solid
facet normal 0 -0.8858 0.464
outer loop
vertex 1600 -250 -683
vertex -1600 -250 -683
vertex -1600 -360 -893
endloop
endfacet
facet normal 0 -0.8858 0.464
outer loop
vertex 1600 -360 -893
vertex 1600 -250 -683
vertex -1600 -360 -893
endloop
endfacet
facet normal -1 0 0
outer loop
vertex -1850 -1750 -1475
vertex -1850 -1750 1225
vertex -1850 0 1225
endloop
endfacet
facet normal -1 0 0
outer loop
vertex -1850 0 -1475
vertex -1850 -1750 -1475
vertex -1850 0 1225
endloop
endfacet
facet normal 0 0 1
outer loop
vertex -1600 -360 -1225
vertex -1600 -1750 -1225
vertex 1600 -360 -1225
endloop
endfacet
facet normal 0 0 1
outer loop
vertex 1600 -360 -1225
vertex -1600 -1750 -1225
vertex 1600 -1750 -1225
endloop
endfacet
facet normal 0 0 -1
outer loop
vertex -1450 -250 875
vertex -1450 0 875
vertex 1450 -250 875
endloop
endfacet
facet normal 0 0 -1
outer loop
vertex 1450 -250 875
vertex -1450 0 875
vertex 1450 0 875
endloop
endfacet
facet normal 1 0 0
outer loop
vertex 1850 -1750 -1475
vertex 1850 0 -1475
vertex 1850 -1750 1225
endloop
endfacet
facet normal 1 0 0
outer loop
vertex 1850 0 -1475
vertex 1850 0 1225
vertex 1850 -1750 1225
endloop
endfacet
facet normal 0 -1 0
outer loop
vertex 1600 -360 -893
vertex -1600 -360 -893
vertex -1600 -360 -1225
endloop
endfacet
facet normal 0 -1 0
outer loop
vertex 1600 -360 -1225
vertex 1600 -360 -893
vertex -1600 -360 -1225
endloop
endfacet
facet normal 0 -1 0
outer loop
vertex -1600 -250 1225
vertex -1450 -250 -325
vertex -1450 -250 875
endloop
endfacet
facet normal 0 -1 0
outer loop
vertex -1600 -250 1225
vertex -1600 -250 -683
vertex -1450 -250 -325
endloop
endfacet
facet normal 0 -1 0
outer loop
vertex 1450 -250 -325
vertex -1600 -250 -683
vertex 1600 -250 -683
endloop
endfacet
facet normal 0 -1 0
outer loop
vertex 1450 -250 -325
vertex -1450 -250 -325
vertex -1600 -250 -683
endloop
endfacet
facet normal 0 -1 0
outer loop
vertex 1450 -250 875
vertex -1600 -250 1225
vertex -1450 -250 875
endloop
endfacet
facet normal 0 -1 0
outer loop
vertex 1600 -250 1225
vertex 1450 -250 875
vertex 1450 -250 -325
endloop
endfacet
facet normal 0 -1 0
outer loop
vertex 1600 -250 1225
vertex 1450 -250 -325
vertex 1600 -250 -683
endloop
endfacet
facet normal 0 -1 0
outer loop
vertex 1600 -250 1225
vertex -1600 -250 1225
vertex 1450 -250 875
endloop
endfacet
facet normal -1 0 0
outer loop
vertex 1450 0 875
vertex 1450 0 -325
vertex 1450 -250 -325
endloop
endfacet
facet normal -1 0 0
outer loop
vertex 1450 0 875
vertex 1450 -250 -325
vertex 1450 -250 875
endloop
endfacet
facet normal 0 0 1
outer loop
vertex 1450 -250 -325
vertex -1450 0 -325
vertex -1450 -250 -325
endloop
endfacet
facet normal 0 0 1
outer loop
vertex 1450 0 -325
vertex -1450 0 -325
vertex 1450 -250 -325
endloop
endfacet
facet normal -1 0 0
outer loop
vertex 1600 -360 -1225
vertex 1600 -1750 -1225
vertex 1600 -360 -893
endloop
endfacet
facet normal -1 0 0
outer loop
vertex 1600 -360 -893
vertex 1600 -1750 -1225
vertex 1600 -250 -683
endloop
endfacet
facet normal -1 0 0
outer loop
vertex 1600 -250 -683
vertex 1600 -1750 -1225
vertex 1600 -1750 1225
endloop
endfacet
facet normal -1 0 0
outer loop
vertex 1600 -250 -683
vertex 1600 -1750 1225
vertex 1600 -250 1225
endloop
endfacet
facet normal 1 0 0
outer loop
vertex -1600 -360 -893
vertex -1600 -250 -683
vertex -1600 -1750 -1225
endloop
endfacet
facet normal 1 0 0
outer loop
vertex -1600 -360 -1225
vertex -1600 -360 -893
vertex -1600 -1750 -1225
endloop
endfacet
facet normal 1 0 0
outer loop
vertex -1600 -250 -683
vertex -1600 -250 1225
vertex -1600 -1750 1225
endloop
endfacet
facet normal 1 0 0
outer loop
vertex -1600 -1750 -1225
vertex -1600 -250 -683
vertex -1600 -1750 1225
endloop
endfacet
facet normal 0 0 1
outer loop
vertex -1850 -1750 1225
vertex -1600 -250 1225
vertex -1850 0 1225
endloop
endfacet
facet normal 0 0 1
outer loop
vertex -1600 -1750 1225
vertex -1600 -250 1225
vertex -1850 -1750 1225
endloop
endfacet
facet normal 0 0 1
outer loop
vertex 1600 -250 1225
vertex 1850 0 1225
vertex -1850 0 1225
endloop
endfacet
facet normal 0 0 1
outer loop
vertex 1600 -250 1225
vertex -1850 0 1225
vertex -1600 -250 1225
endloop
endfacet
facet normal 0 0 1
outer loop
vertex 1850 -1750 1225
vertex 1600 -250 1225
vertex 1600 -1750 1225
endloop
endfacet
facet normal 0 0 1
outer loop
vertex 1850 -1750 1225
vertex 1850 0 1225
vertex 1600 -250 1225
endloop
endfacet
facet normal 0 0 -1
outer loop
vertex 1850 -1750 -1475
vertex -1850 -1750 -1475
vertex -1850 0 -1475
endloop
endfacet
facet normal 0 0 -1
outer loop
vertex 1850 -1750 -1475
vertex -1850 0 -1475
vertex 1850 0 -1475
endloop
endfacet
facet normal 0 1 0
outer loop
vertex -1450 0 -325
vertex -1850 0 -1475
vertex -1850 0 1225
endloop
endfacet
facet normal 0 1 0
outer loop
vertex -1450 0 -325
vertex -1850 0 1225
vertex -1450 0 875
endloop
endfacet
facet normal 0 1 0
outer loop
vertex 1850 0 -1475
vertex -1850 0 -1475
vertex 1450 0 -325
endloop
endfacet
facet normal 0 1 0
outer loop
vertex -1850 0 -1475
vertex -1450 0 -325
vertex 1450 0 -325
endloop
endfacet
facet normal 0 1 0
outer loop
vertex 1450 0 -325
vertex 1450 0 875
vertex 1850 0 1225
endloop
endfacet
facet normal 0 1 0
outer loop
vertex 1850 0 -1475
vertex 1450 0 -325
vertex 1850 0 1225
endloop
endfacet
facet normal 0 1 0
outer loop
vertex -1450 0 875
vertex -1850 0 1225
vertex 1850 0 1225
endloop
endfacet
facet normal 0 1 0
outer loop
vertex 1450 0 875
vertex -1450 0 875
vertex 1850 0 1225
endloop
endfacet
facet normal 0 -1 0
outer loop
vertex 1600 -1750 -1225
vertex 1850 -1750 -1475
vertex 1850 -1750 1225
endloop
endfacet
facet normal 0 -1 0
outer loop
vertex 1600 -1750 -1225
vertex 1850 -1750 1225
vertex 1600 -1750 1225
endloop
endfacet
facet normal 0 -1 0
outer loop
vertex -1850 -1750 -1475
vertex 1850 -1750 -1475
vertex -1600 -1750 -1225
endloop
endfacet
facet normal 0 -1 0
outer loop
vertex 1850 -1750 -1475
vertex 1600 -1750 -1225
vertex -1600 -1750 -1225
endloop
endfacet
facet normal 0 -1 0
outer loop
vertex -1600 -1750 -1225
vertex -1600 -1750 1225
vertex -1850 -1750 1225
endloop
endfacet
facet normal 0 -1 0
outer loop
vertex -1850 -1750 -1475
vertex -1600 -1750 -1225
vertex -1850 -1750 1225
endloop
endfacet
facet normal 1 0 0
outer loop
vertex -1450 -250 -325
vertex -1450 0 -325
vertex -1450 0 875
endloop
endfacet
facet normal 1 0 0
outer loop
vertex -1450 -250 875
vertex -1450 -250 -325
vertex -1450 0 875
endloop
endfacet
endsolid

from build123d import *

# Parameters (mm, degrees)
F0_W     = 3200
F0_H     = 2450
F0_W_2   = 2900
F0_H_2   = 1200
F1_DEPTH = 250
F2_W     = 1500
F2_H     = 2450
F2_W_2   = 250
F3_DEPTH = 250
F4_W     = 1750
F4_H     = 2450
F5_DEPTH = 250
F6_W     = 3200
F6_H     = 1500
F7_DEPTH = 250
F9_DEPTH = 3200


with BuildPart() as f1:
    # F0 (on Front) → F1 (new body)
    with BuildSketch(Plane.XZ):
        Rectangle(F0_W, F0_H)
        with Locations((0, 275)):
            Rectangle(F0_W_2, F0_H_2, mode=Mode.SUBTRACT)
    extrude(amount=F1_DEPTH)

    # F2 (on face) → F3 (join)
    with BuildSketch(Plane.YZ.offset(1600)):
        with Locations((-1000, 0)):
            Rectangle(F2_W, F2_H)
        with Locations((-125, 0)):
            Rectangle(F2_W_2, F2_H)
    extrude(amount=F3_DEPTH)

    # F4 (on face) → F5 (join)
    with BuildSketch(Plane(origin=(-1600, 0, 0), x_dir=(0, -1, 0), z_dir=(-1, 0, 0))):
        with Locations((875, 0)):
            Rectangle(F4_W, F4_H)
    extrude(amount=F5_DEPTH)

    # F6 (on face) → F7 (join)
    with BuildSketch(Plane(origin=(0, 0, -1225), x_dir=(1, 0, 0), z_dir=(0, 0, -1))):
        with Locations((0, 1000)):
            Rectangle(F6_W, F6_H)
        Polygon((-1850, 1750), (-1850, 0), (1850, 0), (1850, 1750), (1600, 1750), (1600, 250), (-1600, 250), (-1600, 1750), align=None)
    extrude(amount=F7_DEPTH)

    # F8 (on face) → F9 (join, through all)
    with BuildSketch(Plane.YZ.offset(-1600)):
        Polygon((-360, -1225), (-250, -1225), (-250, -683), (-360, -893), align=None)
    extrude(amount=F9_DEPTH)


solid = f1.part
